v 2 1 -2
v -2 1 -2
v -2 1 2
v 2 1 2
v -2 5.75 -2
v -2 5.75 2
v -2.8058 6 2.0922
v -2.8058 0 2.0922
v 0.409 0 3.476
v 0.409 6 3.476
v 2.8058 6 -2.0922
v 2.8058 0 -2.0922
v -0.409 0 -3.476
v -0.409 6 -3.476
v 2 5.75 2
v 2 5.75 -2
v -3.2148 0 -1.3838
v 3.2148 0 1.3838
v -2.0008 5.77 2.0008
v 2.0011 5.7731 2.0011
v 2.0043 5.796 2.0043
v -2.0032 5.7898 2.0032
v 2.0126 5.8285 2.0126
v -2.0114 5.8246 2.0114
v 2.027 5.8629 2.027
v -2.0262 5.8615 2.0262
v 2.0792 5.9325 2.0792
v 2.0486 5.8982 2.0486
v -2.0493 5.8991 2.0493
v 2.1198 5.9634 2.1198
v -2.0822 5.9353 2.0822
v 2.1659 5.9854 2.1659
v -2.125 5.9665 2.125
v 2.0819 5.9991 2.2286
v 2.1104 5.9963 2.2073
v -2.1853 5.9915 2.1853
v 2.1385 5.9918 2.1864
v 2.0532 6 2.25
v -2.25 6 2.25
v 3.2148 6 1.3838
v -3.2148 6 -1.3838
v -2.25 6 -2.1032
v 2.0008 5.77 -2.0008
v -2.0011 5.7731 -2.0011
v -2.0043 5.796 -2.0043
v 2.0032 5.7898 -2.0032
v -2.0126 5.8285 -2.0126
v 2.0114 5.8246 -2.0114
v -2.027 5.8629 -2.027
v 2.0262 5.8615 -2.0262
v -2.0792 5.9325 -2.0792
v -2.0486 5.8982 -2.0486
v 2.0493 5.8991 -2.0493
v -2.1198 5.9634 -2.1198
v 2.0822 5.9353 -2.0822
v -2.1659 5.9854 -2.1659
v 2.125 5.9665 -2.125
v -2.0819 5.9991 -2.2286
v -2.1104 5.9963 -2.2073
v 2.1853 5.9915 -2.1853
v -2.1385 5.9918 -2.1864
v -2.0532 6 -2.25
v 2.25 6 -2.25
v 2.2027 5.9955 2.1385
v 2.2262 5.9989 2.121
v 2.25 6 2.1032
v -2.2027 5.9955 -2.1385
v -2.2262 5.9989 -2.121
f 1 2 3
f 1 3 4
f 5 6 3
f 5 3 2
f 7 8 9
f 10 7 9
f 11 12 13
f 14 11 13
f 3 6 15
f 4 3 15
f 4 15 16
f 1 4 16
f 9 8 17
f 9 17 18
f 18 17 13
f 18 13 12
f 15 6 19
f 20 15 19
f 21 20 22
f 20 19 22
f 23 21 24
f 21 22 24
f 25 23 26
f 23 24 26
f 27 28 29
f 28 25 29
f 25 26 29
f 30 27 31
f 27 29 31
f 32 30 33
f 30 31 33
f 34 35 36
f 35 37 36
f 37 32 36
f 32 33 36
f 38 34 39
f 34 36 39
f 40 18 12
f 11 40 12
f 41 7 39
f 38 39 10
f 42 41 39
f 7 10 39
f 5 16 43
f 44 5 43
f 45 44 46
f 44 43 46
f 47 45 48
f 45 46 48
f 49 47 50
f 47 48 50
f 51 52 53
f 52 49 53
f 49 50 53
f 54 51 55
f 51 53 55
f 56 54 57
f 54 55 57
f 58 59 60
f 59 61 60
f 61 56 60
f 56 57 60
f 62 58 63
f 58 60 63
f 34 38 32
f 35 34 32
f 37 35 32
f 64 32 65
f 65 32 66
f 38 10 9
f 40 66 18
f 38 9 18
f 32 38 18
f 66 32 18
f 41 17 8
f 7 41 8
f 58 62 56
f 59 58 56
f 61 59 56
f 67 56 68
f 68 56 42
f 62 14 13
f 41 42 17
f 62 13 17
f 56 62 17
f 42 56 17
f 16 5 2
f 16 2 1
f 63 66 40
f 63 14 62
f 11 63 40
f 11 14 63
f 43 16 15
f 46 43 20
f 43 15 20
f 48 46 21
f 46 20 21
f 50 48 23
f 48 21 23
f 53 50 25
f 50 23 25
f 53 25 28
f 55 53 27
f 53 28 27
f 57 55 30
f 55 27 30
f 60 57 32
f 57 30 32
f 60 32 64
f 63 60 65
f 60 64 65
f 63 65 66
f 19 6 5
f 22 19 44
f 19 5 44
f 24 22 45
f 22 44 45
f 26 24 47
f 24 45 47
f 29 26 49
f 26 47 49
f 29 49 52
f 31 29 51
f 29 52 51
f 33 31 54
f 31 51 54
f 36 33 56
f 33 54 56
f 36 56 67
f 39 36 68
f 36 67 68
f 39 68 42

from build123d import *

# Parameters (mm, degrees)
BOSS_EXTRUDE1_DEPTH = 6
SKETCH2_W           = 4
SKETCH2_H           = 4
CUT_EXTRUDE1_DEPTH  = 5
FILLET1_R           = 0.25


with BuildPart() as part:
    # Sketch1 → Boss-Extrude1 (new body)
    with BuildSketch(Plane(origin=(0, 0, 0), x_dir=(1, 0, 0), z_dir=(0, 1, 0))):
        Polygon((3.214834695, -1.383776673), (2.8058031, 2.092240179), (-0.409031596, 3.476016852), (-3.214834695, 1.383776673), (-2.8058031, -2.092240179), (0.409031596, -3.476016852), align=None)
    extrude(amount=BOSS_EXTRUDE1_DEPTH)

    # Sketch2 → Cut-Extrude1 (cut)
    with BuildSketch(Plane(origin=(0, 6, 0), x_dir=(1, 0, 0), z_dir=(0, 1, 0))):
        Rectangle(SKETCH2_W, SKETCH2_H)
    extrude(amount=-CUT_EXTRUDE1_DEPTH, mode=Mode.SUBTRACT)

    # Fillet1
    # the kernel refuses this fillet: 0.25 mm, written as the material it takes off along each edge
    with BuildSketch(Plane(origin=(-2, 6, -2), x_dir=(-1, 0, 0), z_dir=(0, 0, 1)), Plane(origin=(2, 6, -2), x_dir=(0, 0, -1), z_dir=(-1, 0, 0)), Plane(origin=(-2, 6, 2), x_dir=(0, 0, 1), z_dir=(1, 0, 0)), Plane(origin=(2, 6, 2), x_dir=(1, 0, 0), z_dir=(0, 0, -1))) as fillet1_piece_1:
        with BuildLine():
            CenterArc((FILLET1_R, FILLET1_R), FILLET1_R, 180, 90)
            Line((0, FILLET1_R), (-FILLET1_R * 0.02, FILLET1_R))
            Line((-FILLET1_R * 0.02, FILLET1_R), (-FILLET1_R * 0.02, -FILLET1_R * 0.02))
            Line((-FILLET1_R * 0.02, -FILLET1_R * 0.02), (FILLET1_R, -FILLET1_R * 0.02))
            Line((FILLET1_R, -FILLET1_R * 0.02), (FILLET1_R, 0))
        make_face()
    extrude(amount=4, mode=Mode.SUBTRACT)
    with BuildSketch(Plane(origin=(2, 6, -2), x_dir=(0, 0, -1), z_dir=(-1, 0, 0))) as fillet1_piece_2a_section:
        with BuildLine():
            CenterArc((FILLET1_R, FILLET1_R), FILLET1_R, 180, 90)
            Line((0, FILLET1_R), (-FILLET1_R * 0.02, FILLET1_R))
            Line((-FILLET1_R * 0.02, FILLET1_R), (-FILLET1_R * 0.02, -FILLET1_R * 0.02))
            Line((-FILLET1_R * 0.02, -FILLET1_R * 0.02), (FILLET1_R, -FILLET1_R * 0.02))
            Line((FILLET1_R, -FILLET1_R * 0.02), (FILLET1_R, 0))
        make_face()
    fillet1_piece_2a = extrude(amount=4.625, mode=Mode.PRIVATE)
    fillet1_piece_2a = split(fillet1_piece_2a, bisect_by=Plane(origin=(-2, 5.943401221, -2.056598779), z_dir=(-1, 0, 0)), keep=Keep.TOP, mode=Mode.PRIVATE)
    with BuildSketch(Plane(origin=(-2, 6, -2.625), x_dir=(-1, 0, 0), z_dir=(0, 0, 1))) as fillet1_piece_2b_section:
        with BuildLine():
            CenterArc((FILLET1_R, FILLET1_R), FILLET1_R, 180, 90)
            Line((0, FILLET1_R), (-FILLET1_R * 0.02, FILLET1_R))
            Line((-FILLET1_R * 0.02, FILLET1_R), (-FILLET1_R * 0.02, -FILLET1_R * 0.02))
            Line((-FILLET1_R * 0.02, -FILLET1_R * 0.02), (FILLET1_R, -FILLET1_R * 0.02))
            Line((FILLET1_R, -FILLET1_R * 0.02), (FILLET1_R, 0))
        make_face()
    fillet1_piece_2b = extrude(amount=4.625, mode=Mode.PRIVATE)
    fillet1_piece_2b = split(fillet1_piece_2b, bisect_by=Plane(origin=(-2.056598779, 5.943401221, -2), z_dir=(0, 0, -1)), keep=Keep.TOP, mode=Mode.PRIVATE)
    fillet1_piece_2 = fillet1_piece_2a & fillet1_piece_2b
    add(fillet1_piece_2, mode=Mode.SUBTRACT)
    with BuildSketch(Plane(origin=(-2.625, 6, 2), x_dir=(0, 0, 1), z_dir=(1, 0, 0))) as fillet1_piece_3a_section:
        with BuildLine():
            CenterArc((FILLET1_R, FILLET1_R), FILLET1_R, 180, 90)
            Line((0, FILLET1_R), (-FILLET1_R * 0.02, FILLET1_R))
            Line((-FILLET1_R * 0.02, FILLET1_R), (-FILLET1_R * 0.02, -FILLET1_R * 0.02))
            Line((-FILLET1_R * 0.02, -FILLET1_R * 0.02), (FILLET1_R, -FILLET1_R * 0.02))
            Line((FILLET1_R, -FILLET1_R * 0.02), (FILLET1_R, 0))
        make_face()
    fillet1_piece_3a = extrude(amount=4.625, mode=Mode.PRIVATE)
    fillet1_piece_3a = split(fillet1_piece_3a, bisect_by=Plane(origin=(-2, 5.943401221, 2.056598779), z_dir=(-1, 0, 0)), keep=Keep.TOP, mode=Mode.PRIVATE)
    with BuildSketch(Plane(origin=(-2, 6, -2), x_dir=(-1, 0, 0), z_dir=(0, 0, 1))) as fillet1_piece_3b_section:
        with BuildLine():
            CenterArc((FILLET1_R, FILLET1_R), FILLET1_R, 180, 90)
            Line((0, FILLET1_R), (-FILLET1_R * 0.02, FILLET1_R))
            Line((-FILLET1_R * 0.02, FILLET1_R), (-FILLET1_R * 0.02, -FILLET1_R * 0.02))
            Line((-FILLET1_R * 0.02, -FILLET1_R * 0.02), (FILLET1_R, -FILLET1_R * 0.02))
            Line((FILLET1_R, -FILLET1_R * 0.02), (FILLET1_R, 0))
        make_face()
    fillet1_piece_3b = extrude(amount=4.625, mode=Mode.PRIVATE)
    fillet1_piece_3b = split(fillet1_piece_3b, bisect_by=Plane(origin=(-2.056598779, 5.943401221, 2), z_dir=(0, 0, 1)), keep=Keep.TOP, mode=Mode.PRIVATE)
    fillet1_piece_3 = fillet1_piece_3a & fillet1_piece_3b
    add(fillet1_piece_3, mode=Mode.SUBTRACT)
    with BuildSketch(Plane(origin=(2, 6, 2), x_dir=(1, 0, 0), z_dir=(0, 0, -1))) as fillet1_piece_4a_section:
        with BuildLine():
            CenterArc((FILLET1_R, FILLET1_R), FILLET1_R, 180, 90)
            Line((0, FILLET1_R), (-FILLET1_R * 0.02, FILLET1_R))
            Line((-FILLET1_R * 0.02, FILLET1_R), (-FILLET1_R * 0.02, -FILLET1_R * 0.02))
            Line((-FILLET1_R * 0.02, -FILLET1_R * 0.02), (FILLET1_R, -FILLET1_R * 0.02))
            Line((FILLET1_R, -FILLET1_R * 0.02), (FILLET1_R, 0))
        make_face()
    fillet1_piece_4a = extrude(amount=4.625, mode=Mode.PRIVATE)
    fillet1_piece_4a = split(fillet1_piece_4a, bisect_by=Plane(origin=(2.056598779, 5.943401221, -2), z_dir=(0, 0, -1)), keep=Keep.TOP, mode=Mode.PRIVATE)
    with BuildSketch(Plane(origin=(2.625, 6, -2), x_dir=(0, 0, -1), z_dir=(-1, 0, 0))) as fillet1_piece_4b_section:
        with BuildLine():
            CenterArc((FILLET1_R, FILLET1_R), FILLET1_R, 180, 90)
            Line((0, FILLET1_R), (-FILLET1_R * 0.02, FILLET1_R))
            Line((-FILLET1_R * 0.02, FILLET1_R), (-FILLET1_R * 0.02, -FILLET1_R * 0.02))
            Line((-FILLET1_R * 0.02, -FILLET1_R * 0.02), (FILLET1_R, -FILLET1_R * 0.02))
            Line((FILLET1_R, -FILLET1_R * 0.02), (FILLET1_R, 0))
        make_face()
    fillet1_piece_4b = extrude(amount=4.625, mode=Mode.PRIVATE)
    fillet1_piece_4b = split(fillet1_piece_4b, bisect_by=Plane(origin=(2, 5.943401221, -2.056598779), z_dir=(1, 0, 0)), keep=Keep.TOP, mode=Mode.PRIVATE)
    fillet1_piece_4 = fillet1_piece_4a & fillet1_piece_4b
    add(fillet1_piece_4, mode=Mode.SUBTRACT)
    with BuildSketch(Plane(origin=(-2, 6, 2), x_dir=(0, 0, 1), z_dir=(1, 0, 0))) as fillet1_piece_5a_section:
        with BuildLine():
            CenterArc((FILLET1_R, FILLET1_R), FILLET1_R, 180, 90)
            Line((0, FILLET1_R), (-FILLET1_R * 0.02, FILLET1_R))
            Line((-FILLET1_R * 0.02, FILLET1_R), (-FILLET1_R * 0.02, -FILLET1_R * 0.02))
            Line((-FILLET1_R * 0.02, -FILLET1_R * 0.02), (FILLET1_R, -FILLET1_R * 0.02))
            Line((FILLET1_R, -FILLET1_R * 0.02), (FILLET1_R, 0))
        make_face()
    fillet1_piece_5a = extrude(amount=4.625, mode=Mode.PRIVATE)
    fillet1_piece_5a = split(fillet1_piece_5a, bisect_by=Plane(origin=(2, 5.943401221, 2.056598779), z_dir=(1, 0, 0)), keep=Keep.TOP, mode=Mode.PRIVATE)
    with BuildSketch(Plane(origin=(2, 6, 2.625), x_dir=(1, 0, 0), z_dir=(0, 0, -1))) as fillet1_piece_5b_section:
        with BuildLine():
            CenterArc((FILLET1_R, FILLET1_R), FILLET1_R, 180, 90)
            Line((0, FILLET1_R), (-FILLET1_R * 0.02, FILLET1_R))
            Line((-FILLET1_R * 0.02, FILLET1_R), (-FILLET1_R * 0.02, -FILLET1_R * 0.02))
            Line((-FILLET1_R * 0.02, -FILLET1_R * 0.02), (FILLET1_R, -FILLET1_R * 0.02))
            Line((FILLET1_R, -FILLET1_R * 0.02), (FILLET1_R, 0))
        make_face()
    fillet1_piece_5b = extrude(amount=4.625, mode=Mode.PRIVATE)
    fillet1_piece_5b = split(fillet1_piece_5b, bisect_by=Plane(origin=(2.056598779, 5.943401221, 2), z_dir=(0, 0, 1)), keep=Keep.TOP, mode=Mode.PRIVATE)
    fillet1_piece_5 = fillet1_piece_5a & fillet1_piece_5b
    add(fillet1_piece_5, mode=Mode.SUBTRACT)


solid = part.part
